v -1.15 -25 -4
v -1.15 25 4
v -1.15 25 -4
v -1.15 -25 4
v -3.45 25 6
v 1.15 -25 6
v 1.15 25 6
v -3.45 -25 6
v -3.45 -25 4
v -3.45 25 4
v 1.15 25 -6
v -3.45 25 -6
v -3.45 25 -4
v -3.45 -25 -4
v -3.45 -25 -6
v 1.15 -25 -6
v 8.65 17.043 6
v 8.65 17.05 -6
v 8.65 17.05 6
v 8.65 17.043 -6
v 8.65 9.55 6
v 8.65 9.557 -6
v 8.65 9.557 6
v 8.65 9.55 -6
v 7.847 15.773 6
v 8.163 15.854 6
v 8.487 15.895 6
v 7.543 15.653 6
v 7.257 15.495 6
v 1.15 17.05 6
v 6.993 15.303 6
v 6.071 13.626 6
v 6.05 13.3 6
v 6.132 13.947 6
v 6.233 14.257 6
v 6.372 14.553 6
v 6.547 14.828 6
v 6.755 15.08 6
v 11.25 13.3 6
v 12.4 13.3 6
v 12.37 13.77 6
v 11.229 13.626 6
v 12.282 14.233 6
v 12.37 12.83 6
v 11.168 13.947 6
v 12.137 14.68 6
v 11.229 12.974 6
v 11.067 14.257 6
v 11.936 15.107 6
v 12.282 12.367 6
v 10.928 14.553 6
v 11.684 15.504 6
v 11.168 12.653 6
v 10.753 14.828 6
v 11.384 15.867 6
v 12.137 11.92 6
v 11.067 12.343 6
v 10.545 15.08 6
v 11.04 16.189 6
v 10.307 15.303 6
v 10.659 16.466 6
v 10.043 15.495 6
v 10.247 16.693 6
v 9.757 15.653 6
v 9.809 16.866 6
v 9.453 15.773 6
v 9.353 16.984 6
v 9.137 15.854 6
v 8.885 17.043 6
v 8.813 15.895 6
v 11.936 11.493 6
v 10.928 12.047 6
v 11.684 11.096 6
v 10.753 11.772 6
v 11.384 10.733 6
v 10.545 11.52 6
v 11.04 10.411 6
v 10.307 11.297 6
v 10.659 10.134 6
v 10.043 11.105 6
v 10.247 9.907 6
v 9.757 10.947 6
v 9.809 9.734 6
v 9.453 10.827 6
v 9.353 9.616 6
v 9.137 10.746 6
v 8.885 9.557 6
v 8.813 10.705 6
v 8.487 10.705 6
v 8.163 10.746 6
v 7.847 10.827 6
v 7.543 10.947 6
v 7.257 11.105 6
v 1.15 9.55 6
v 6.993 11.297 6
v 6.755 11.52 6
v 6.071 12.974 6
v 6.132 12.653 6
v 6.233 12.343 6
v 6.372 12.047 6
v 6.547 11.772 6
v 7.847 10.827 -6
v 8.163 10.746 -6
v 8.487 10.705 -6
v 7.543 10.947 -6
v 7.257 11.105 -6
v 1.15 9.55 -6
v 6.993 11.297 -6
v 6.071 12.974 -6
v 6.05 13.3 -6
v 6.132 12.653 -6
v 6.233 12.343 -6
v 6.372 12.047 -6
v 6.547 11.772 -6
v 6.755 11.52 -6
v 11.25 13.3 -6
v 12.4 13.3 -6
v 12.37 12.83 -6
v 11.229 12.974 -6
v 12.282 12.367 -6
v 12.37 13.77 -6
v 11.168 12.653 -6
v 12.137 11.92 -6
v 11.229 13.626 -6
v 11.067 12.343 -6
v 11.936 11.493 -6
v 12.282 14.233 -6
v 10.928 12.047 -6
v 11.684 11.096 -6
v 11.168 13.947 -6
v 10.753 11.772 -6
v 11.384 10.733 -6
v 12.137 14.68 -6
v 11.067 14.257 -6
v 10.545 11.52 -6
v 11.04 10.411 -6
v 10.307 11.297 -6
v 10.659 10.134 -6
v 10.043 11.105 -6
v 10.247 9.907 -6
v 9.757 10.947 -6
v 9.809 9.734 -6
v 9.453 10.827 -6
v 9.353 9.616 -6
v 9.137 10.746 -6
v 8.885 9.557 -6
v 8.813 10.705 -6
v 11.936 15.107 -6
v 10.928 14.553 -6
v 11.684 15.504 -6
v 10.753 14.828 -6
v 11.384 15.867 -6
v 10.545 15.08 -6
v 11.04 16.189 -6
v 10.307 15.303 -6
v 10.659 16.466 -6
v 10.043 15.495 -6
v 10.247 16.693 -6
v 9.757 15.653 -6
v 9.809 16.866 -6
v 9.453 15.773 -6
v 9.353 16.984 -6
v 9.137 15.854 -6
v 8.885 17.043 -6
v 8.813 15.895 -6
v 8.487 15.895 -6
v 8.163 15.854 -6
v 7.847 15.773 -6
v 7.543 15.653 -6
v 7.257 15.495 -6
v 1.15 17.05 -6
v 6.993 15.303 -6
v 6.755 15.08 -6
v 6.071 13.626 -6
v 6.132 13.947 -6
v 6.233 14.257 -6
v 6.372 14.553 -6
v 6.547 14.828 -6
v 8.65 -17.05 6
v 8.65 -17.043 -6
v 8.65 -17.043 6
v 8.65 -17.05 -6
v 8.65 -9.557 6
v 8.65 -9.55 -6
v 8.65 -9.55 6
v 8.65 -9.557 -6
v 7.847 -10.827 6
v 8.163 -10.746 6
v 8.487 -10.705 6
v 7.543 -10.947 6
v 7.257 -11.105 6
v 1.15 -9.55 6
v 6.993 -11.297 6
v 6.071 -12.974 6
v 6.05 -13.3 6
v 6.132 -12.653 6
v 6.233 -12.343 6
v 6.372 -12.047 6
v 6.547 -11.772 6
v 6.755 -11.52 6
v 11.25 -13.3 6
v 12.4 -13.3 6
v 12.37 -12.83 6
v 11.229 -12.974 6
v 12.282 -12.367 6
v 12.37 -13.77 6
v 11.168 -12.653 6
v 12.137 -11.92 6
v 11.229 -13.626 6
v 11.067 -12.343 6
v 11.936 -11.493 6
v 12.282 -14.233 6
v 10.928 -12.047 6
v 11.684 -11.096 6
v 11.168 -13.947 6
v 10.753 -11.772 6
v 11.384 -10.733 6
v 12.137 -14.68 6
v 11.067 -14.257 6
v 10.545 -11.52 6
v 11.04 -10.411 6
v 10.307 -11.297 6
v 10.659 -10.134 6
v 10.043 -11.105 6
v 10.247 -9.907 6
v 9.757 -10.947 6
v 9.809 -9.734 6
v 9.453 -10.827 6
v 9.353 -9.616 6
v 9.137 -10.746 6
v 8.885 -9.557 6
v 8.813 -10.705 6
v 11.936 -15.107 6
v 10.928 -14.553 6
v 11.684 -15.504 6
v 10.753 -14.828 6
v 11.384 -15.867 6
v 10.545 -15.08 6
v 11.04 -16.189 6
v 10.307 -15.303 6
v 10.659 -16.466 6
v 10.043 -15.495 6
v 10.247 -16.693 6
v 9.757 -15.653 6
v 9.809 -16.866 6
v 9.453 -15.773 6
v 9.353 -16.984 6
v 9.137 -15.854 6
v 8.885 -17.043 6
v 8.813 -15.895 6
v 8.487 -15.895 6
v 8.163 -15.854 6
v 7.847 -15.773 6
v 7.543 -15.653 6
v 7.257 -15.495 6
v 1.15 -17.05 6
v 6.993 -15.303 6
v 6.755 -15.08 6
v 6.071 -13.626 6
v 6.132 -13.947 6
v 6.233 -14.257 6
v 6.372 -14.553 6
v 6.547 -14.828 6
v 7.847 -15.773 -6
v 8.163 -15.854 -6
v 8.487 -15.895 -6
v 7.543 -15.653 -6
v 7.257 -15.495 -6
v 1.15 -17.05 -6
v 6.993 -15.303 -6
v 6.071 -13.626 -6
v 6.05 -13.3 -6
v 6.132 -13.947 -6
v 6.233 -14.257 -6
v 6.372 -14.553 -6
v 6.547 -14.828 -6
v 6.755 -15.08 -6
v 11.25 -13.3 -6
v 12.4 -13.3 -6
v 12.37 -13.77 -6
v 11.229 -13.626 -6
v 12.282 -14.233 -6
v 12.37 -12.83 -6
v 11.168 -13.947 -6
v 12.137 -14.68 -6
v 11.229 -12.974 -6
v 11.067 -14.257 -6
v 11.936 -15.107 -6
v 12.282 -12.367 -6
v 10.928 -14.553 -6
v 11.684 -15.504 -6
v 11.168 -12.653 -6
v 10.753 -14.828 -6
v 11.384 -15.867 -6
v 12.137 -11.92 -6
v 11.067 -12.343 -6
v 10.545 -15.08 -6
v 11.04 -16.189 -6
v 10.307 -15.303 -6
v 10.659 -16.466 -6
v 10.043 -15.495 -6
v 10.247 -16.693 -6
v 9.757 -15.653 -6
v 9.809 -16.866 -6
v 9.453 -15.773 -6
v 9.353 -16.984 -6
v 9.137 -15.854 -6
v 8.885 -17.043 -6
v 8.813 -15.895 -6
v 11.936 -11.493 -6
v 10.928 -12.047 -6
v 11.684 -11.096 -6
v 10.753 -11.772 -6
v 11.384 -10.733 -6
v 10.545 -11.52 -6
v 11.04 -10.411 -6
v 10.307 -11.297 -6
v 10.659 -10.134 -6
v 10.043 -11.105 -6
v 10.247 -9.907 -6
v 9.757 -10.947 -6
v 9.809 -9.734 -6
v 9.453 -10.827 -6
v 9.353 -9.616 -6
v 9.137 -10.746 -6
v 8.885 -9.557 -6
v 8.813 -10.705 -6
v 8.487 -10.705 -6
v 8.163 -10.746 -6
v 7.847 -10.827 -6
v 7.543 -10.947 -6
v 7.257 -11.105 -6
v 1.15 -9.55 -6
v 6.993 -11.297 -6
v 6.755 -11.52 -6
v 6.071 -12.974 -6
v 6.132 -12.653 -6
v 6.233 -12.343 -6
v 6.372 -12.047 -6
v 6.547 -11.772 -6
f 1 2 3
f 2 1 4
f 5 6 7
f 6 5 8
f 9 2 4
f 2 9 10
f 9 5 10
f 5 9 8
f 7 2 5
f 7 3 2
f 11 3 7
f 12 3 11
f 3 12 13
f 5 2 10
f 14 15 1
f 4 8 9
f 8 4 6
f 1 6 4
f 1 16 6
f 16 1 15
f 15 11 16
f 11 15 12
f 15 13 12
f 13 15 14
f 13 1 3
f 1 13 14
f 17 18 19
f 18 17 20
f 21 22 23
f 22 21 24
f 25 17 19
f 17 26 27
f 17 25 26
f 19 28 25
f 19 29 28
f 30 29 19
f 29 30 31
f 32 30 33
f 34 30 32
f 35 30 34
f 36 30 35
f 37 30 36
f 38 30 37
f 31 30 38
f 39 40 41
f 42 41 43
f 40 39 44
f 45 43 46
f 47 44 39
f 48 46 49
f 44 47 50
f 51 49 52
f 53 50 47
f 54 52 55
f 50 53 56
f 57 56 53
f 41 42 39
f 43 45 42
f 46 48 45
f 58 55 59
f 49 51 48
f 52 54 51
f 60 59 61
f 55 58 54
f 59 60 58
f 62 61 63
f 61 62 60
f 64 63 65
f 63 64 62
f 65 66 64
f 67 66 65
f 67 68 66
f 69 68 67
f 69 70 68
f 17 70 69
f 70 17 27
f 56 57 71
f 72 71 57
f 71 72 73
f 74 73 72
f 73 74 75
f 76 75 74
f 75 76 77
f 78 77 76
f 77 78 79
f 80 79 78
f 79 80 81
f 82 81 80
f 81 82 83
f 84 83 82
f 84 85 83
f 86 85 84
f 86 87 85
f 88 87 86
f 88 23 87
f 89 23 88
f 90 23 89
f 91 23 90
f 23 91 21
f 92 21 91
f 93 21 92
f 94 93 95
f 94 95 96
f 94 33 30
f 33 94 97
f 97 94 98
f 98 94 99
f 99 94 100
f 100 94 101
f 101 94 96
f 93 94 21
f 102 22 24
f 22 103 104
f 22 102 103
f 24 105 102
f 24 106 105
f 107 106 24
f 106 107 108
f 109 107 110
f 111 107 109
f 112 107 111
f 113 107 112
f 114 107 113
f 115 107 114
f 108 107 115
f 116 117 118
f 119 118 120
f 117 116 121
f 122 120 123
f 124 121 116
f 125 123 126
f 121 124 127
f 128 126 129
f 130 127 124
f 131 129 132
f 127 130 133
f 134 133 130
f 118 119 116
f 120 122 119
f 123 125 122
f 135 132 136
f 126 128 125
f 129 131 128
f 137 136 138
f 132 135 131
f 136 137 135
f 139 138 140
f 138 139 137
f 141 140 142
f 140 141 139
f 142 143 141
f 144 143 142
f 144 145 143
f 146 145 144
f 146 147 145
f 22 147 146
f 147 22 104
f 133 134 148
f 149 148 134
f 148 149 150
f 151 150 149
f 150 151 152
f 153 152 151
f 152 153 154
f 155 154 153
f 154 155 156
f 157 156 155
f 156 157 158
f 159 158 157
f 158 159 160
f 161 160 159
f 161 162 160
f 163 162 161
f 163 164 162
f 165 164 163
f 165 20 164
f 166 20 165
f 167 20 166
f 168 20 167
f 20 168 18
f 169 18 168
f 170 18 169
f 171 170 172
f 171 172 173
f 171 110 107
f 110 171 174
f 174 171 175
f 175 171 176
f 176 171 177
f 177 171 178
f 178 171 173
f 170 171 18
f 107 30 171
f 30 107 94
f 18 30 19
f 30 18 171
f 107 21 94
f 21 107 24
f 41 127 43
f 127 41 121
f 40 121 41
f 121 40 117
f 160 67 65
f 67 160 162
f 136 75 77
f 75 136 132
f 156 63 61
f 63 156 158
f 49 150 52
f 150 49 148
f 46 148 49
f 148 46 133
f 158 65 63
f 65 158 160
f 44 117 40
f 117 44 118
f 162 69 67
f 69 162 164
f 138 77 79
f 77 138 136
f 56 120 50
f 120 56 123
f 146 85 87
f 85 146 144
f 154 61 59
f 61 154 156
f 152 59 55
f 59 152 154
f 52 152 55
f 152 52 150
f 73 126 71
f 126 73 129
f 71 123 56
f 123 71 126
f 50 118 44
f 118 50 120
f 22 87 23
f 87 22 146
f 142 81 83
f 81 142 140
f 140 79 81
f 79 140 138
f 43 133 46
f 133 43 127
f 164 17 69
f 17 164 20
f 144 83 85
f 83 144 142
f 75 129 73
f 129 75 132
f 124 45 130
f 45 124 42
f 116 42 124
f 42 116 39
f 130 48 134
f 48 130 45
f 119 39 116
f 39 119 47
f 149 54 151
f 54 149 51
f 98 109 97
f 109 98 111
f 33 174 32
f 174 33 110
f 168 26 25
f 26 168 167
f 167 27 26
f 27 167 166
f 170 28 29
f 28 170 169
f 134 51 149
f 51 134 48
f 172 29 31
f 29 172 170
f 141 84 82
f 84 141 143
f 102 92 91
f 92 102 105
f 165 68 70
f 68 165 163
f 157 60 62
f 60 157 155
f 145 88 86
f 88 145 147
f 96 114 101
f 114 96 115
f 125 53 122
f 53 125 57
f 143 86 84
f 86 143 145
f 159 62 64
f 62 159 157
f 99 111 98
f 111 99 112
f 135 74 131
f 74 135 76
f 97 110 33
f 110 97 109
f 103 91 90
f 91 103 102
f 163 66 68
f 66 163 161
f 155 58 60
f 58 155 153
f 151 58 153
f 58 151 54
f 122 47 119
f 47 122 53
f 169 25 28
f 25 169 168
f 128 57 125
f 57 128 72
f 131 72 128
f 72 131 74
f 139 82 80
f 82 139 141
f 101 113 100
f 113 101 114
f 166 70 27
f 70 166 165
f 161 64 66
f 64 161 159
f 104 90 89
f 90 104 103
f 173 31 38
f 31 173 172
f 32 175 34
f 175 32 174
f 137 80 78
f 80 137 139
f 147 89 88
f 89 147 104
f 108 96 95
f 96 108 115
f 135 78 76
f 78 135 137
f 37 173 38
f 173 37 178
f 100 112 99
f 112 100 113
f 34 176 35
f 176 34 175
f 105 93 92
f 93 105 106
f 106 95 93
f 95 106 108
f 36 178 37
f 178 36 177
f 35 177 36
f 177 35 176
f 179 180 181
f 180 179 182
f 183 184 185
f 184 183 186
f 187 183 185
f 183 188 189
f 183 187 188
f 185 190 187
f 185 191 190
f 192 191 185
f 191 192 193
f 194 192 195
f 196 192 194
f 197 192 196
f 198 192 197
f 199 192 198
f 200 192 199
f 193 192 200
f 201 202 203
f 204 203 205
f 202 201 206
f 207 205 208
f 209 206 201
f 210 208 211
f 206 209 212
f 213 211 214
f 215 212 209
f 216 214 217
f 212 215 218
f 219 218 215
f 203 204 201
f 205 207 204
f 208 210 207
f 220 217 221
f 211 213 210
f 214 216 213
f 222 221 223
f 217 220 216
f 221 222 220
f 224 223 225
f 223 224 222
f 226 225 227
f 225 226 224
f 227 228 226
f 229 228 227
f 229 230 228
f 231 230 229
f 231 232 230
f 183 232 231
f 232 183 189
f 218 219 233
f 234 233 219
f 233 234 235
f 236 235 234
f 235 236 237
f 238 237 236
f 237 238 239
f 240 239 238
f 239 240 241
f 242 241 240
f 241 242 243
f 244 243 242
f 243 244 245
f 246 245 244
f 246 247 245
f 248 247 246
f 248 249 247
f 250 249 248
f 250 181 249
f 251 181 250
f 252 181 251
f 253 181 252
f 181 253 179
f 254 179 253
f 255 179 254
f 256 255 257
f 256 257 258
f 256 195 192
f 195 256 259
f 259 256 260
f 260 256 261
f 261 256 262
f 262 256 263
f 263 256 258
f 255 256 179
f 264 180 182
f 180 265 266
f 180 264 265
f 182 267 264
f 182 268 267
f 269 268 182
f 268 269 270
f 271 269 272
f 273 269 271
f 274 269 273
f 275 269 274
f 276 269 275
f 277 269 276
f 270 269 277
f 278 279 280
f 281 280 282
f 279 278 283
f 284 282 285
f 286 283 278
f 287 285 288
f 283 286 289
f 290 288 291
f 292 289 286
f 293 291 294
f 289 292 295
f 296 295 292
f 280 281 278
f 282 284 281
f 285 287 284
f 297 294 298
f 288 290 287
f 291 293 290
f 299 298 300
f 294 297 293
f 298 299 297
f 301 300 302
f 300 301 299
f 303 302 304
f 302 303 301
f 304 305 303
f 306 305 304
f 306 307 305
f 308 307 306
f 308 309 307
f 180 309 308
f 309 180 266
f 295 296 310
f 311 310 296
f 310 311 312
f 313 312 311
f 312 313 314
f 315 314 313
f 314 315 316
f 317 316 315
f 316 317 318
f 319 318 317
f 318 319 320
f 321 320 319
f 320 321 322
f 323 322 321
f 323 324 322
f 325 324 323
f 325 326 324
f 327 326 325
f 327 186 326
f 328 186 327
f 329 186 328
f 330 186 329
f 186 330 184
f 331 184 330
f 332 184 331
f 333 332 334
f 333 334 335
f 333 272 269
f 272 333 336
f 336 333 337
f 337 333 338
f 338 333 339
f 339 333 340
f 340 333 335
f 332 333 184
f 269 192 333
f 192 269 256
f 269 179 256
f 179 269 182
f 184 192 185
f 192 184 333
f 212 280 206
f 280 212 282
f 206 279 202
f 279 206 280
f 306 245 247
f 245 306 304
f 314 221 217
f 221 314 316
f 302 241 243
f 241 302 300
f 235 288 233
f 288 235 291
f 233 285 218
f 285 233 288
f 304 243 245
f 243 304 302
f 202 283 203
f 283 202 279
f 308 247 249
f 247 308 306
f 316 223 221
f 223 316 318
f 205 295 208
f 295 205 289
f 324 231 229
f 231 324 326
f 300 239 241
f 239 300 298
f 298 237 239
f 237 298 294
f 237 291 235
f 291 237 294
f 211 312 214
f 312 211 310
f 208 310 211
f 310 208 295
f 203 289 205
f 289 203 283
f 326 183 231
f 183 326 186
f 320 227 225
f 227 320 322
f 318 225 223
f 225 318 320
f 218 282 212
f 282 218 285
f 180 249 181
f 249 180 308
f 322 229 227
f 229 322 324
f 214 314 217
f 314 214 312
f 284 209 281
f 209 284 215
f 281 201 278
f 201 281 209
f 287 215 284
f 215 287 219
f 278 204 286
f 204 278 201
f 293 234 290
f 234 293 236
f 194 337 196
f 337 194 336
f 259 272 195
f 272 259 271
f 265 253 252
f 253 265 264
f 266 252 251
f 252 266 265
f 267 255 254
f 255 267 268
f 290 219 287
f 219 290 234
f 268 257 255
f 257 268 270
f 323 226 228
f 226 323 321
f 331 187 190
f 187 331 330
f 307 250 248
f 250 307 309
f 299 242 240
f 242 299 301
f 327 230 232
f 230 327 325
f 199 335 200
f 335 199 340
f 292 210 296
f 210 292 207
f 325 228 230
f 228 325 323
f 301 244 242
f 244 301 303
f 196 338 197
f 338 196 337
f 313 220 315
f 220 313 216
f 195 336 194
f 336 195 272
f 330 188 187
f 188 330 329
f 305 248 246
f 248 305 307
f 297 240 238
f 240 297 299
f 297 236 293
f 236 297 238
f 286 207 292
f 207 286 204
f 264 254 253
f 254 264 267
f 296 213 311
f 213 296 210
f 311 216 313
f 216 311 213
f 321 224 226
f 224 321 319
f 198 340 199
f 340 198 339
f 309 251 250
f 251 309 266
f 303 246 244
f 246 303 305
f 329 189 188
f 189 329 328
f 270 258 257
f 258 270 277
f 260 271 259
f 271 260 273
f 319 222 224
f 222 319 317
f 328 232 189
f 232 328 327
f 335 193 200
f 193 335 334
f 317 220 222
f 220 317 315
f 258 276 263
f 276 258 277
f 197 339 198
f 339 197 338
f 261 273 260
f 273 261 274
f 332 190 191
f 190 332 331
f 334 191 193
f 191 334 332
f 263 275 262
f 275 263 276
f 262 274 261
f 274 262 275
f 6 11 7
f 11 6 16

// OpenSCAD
// 2016 Paul Nokel <pnokel@gmail.com>
// LED Bar (this is the sruface on which you mount your LED strip)
led_bar_height = 12; // [10:100]
led_bar_width = 50; // [10:200]
led_bar_thickness=2.3; // [1:0.1:10]

// Add a top and bottom border to the LED bar
add_border = 1; // [1:Yes,0:No]
border_thickness = 2; // [1:10]

alu_spacer_diameter = 5; // [1:15]
// Distance between the spacers
alu_spacer_distance = 26.6; // [1:0.1:100]

/* [Hidden] */
mounting_hole_outer_diameter=alu_spacer_diameter+alu_spacer_diameter/2;
// adjust the diameter of the spacer
alu_spacer_diameter_real=alu_spacer_diameter+0.2;

// LED Strip
cube([led_bar_thickness, led_bar_width, led_bar_height], center=true);
// LED Strip Border
if(add_border == 1) {
    translate([-led_bar_thickness, 0, led_bar_height/2-border_thickness/2]) cube([led_bar_thickness, led_bar_width, border_thickness], center=true);
    mirror([0, 0, 1]) translate([-led_bar_thickness, 0, led_bar_height/2-border_thickness/2]) cube([led_bar_thickness, led_bar_width, border_thickness], center=true);
}
// mounting holes for the spacers
translate([mounting_hole_outer_diameter+led_bar_thickness/2, alu_spacer_distance/2, 0]) genSpacerMountingPoint();
mirror([0, -1, 0]) translate([mounting_hole_outer_diameter+led_bar_thickness/2, alu_spacer_distance/2, 0]) genSpacerMountingPoint();

module genSpacerMountingPoint() {
    difference() {
        union() {
            translate([-mounting_hole_outer_diameter/2, 0, 0]) cube([mounting_hole_outer_diameter, mounting_hole_outer_diameter, led_bar_height], center=true);
            cylinder(led_bar_height, mounting_hole_outer_diameter/2, mounting_hole_outer_diameter/2, center=true, $fn=50);
        }
        cylinder(led_bar_height, alu_spacer_diameter_real/2, alu_spacer_diameter_real/2, center=true, $fn=50);
    }
}
